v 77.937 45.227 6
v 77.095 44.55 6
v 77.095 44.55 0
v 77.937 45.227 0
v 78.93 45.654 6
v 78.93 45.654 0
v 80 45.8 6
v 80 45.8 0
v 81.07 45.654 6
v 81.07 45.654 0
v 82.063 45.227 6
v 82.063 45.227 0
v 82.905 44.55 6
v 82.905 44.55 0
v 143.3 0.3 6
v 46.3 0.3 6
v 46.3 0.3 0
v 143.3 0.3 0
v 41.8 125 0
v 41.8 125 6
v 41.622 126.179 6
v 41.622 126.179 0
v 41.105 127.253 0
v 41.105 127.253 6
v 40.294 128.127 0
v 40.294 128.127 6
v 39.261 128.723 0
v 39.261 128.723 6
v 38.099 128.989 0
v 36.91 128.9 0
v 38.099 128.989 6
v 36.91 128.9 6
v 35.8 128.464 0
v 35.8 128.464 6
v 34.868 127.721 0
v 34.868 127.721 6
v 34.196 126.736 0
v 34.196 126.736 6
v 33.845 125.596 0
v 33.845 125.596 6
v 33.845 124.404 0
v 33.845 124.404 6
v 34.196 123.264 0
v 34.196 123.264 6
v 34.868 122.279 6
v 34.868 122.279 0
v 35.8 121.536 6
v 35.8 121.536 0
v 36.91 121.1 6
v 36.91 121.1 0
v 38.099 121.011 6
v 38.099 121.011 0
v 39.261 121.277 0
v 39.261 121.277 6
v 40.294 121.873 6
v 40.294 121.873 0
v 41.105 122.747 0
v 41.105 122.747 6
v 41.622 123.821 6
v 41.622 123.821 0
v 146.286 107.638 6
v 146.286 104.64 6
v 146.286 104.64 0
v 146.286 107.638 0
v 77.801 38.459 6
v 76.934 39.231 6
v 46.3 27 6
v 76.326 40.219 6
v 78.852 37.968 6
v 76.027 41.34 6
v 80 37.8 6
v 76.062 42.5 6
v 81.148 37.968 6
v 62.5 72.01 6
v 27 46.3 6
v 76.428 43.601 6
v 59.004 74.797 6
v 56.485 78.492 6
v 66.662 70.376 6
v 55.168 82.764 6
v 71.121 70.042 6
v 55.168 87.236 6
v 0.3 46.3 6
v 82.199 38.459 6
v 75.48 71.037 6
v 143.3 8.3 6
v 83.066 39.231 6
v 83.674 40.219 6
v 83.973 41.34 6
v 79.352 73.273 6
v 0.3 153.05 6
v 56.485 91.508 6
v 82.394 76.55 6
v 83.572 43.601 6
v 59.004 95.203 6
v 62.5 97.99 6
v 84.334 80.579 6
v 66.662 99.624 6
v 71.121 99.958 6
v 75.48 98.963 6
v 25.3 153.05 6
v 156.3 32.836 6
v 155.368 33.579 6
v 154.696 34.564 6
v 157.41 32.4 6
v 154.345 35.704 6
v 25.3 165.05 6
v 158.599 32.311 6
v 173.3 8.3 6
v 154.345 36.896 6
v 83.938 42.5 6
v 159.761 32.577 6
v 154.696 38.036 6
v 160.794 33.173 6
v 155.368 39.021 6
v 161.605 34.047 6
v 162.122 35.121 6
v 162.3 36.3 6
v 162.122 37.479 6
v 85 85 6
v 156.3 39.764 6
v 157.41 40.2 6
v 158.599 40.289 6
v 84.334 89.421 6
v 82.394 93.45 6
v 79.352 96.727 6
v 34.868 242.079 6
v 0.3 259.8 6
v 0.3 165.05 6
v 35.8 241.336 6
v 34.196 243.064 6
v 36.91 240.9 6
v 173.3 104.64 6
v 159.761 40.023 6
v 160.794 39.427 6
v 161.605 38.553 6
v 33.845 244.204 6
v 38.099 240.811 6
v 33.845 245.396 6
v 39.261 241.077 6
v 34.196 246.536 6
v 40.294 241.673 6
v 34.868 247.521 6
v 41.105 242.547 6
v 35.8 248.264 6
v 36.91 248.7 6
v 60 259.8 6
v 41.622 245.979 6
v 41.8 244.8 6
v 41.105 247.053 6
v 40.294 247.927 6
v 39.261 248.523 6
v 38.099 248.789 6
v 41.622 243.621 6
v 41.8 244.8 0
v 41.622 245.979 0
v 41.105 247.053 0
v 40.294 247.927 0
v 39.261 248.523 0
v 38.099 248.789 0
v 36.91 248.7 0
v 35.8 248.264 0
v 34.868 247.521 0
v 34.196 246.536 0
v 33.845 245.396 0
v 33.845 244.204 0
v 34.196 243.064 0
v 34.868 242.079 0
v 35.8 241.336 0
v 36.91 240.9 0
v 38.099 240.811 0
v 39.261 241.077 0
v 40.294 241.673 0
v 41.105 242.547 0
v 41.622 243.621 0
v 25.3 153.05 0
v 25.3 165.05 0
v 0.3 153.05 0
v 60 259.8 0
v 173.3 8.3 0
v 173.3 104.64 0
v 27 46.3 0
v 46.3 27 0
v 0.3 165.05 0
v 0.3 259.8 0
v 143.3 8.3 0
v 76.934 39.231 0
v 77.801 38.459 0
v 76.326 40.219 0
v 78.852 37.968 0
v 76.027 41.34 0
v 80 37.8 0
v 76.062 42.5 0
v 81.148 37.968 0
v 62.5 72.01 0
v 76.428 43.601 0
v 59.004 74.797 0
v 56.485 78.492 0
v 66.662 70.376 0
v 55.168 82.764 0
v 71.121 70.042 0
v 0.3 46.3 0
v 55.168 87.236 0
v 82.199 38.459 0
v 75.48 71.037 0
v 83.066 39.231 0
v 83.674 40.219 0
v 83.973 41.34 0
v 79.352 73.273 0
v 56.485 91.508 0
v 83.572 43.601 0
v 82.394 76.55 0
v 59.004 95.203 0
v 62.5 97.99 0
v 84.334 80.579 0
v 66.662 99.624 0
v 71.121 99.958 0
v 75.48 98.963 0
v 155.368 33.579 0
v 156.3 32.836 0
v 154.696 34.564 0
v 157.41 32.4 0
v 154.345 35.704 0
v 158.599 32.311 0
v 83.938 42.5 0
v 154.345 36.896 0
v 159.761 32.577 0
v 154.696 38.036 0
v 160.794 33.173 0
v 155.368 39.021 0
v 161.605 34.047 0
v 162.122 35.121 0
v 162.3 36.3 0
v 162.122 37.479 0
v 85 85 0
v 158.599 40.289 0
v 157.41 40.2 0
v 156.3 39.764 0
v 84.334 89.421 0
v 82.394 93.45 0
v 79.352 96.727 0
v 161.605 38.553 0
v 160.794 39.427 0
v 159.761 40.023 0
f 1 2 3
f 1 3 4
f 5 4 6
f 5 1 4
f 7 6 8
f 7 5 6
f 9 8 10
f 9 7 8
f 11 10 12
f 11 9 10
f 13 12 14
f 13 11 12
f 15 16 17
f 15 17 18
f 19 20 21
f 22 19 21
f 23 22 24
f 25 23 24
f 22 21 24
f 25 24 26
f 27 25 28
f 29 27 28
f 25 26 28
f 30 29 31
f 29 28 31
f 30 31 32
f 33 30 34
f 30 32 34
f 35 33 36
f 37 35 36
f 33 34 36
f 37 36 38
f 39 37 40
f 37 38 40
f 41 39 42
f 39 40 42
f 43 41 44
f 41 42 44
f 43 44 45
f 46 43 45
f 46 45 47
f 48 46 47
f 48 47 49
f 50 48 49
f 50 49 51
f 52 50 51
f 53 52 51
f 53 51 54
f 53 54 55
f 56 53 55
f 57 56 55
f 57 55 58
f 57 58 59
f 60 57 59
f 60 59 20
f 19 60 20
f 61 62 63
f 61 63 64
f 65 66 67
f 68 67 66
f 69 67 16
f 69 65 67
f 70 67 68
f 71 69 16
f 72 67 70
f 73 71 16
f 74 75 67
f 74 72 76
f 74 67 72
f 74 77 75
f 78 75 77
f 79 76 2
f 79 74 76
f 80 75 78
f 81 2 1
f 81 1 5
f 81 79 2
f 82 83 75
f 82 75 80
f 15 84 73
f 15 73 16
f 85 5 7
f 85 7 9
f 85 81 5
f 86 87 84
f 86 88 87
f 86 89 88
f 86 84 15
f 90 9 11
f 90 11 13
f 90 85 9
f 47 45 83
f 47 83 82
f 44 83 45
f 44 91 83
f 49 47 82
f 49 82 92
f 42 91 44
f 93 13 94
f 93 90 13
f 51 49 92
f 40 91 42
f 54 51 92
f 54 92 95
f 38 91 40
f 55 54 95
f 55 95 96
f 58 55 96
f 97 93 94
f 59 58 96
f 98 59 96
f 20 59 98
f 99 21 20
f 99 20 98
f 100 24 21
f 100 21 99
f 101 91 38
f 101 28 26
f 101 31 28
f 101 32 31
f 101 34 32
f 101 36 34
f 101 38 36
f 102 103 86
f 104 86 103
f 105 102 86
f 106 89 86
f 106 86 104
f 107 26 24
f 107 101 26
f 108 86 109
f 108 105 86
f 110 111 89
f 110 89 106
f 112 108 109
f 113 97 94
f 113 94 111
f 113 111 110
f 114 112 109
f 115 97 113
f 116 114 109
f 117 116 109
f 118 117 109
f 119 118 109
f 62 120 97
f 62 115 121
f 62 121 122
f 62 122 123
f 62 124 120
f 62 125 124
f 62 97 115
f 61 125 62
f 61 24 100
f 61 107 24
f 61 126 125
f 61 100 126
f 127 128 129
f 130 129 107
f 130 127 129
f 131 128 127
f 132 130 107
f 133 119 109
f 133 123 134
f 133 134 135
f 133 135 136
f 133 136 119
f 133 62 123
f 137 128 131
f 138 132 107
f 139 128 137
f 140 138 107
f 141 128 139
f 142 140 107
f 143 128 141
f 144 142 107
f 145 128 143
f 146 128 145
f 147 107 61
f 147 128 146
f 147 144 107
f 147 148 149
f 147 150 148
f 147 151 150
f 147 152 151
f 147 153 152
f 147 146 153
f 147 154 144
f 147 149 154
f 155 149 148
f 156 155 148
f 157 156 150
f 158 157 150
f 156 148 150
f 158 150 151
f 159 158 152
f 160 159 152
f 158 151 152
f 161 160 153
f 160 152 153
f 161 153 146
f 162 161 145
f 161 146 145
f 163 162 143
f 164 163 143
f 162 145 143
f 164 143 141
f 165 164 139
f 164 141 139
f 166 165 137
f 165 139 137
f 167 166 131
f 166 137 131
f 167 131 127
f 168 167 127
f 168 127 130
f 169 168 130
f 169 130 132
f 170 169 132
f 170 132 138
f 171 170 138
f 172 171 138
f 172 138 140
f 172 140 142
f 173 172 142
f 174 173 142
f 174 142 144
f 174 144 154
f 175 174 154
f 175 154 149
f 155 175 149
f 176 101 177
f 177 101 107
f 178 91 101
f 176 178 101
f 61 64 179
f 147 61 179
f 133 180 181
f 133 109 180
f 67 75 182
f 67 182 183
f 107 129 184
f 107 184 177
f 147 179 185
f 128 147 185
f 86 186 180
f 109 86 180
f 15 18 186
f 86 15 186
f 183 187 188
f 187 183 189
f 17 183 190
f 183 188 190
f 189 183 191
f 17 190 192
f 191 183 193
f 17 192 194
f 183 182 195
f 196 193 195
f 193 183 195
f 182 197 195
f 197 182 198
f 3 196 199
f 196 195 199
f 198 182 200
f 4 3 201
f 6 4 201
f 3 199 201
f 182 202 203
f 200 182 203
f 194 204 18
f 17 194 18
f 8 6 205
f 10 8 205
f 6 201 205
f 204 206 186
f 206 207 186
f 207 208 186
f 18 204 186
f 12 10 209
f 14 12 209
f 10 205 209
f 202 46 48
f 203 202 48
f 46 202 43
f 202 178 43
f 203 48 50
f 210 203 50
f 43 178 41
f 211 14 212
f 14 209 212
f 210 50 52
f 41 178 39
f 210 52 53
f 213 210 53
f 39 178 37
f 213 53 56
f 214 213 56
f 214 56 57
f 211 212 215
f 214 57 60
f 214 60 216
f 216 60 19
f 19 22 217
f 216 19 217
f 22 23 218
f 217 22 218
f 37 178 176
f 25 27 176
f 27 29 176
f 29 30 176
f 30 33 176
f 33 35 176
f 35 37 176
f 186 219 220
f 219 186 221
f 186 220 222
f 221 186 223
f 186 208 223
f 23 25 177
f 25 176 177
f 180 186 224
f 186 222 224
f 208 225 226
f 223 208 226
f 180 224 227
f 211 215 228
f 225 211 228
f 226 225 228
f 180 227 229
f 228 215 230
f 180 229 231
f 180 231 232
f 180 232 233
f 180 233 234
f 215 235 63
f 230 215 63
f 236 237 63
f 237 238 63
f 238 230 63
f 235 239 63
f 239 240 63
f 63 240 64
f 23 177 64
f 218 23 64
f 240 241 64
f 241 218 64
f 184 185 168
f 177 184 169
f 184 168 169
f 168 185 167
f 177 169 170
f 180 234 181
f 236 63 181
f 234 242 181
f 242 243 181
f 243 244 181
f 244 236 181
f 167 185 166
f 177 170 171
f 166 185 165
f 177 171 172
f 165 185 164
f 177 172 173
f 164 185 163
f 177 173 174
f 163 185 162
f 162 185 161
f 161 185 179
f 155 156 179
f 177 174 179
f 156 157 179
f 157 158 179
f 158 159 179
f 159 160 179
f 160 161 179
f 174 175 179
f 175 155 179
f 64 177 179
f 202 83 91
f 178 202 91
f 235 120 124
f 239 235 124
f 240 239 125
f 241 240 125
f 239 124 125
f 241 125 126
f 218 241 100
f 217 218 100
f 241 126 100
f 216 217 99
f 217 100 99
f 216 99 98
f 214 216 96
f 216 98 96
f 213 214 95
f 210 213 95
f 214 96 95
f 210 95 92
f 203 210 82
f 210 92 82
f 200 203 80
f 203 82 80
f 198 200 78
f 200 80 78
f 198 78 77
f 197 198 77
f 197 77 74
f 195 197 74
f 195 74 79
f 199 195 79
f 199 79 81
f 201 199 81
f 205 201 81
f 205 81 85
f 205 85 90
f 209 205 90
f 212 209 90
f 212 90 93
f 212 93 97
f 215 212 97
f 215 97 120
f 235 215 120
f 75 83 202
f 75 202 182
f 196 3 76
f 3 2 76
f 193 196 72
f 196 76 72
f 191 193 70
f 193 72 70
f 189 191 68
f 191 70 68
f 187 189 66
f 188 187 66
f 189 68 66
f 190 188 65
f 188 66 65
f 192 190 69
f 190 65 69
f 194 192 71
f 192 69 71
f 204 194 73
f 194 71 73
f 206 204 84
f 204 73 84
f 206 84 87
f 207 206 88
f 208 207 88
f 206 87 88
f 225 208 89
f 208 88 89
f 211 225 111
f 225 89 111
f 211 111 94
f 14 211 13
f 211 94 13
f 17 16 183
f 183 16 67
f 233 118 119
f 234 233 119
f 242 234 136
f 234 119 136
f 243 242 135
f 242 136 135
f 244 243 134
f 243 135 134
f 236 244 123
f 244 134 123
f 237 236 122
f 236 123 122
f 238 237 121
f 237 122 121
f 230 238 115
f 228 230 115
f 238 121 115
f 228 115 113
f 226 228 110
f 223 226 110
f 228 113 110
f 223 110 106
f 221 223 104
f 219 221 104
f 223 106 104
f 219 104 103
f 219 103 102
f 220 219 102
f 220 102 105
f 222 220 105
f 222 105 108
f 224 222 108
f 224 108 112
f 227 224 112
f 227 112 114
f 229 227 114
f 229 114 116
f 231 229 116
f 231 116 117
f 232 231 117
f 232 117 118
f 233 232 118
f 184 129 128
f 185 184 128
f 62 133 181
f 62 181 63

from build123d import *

# Parameters (mm, degrees)
BOSS_EXTRUDE1_DEPTH     = 6
SKETCH2_R               = 4
SKETCH2_R_2             = 15
CUT_EXTRUDE1_DEPTH      = 313.353853826
CROQUIS2_W              = 97
CROQUIS2_H              = 0.3
CORTAR_EXTRUIR1_DEPTH   = 10
CORTAR_EXTRUIR2_DEPTH   = 10
CROQUIS4_R              = 4
CORTAR_EXTRUIR3_DEPTH   = 6
SALIENTE_EXTRUIR2_DEPTH = 6
CROQUIS7_W              = 0.3
CROQUIS7_H              = 222.05
CORTAR_EXTRUIR4_DEPTH   = 6
CROQUIS8_W              = 25
CROQUIS8_H              = 12
CORTAR_EXTRUIR5_DEPTH   = 6
SALIENTE_EXTRUIR3_DEPTH = 10
CORTAR_EXTRUIR6_DEPTH   = 10
SALIENTE_EXTRUIR4_DEPTH = 16
CROQUIS12_W             = 25.313873874
CROQUIS12_H             = 10
CORTAR_EXTRUIR7_DEPTH   = 67
CROQUIS13_R             = 4
CORTAR_EXTRUIR8_DEPTH   = 10
SALIENTE_EXTRUIR5_DEPTH = 6
CROQUIS15_R             = 4
CORTAR_EXTRUIR9_DEPTH   = 10
SALIENTE_EXTRUIR7_DEPTH = 6
CROQUIS18_R             = 4
CORTAR_EXTRUIR10_DEPTH  = 6
SALIENTE_EXTRUIR8_DEPTH = 6


with BuildPart() as part:
    # Sketch1 → Boss-Extrude1 (new body)
    with BuildSketch(Plane.XY):
        Polygon((0, 0), (143.3, 0), (143.3, 8.3), (173.3, 8.3), (173.3, 60), (60, 259.8), (0, 259.8), align=None)
    extrude(amount=BOSS_EXTRUDE1_DEPTH)

    # Sketch2 → Cut-Extrude1 (cut, through all)
    with BuildSketch(Plane.XY.offset(6)):
        with Locations((158.3, 36.3)):
            Circle(SKETCH2_R)
        with Locations((37.8, 244.8)):
            Circle(SKETCH2_R)
        with Locations((37.8, 125)):
            Circle(SKETCH2_R)
        with Locations((80, 43.8)):
            Circle(SKETCH2_R)
        with Locations((70, 85)):
            Circle(SKETCH2_R_2)
        Polygon((46.3, 0), (46.3, 19), (19, 46.3), (0, 46.3), (0, 0), align=None)
    extrude(amount=-CUT_EXTRUDE1_DEPTH, mode=Mode.SUBTRACT)

    # Croquis2 → Cortar-Extruir1 (cut)
    with BuildSketch(Plane.XY.offset(6)):
        with Locations((94.8, 0.15)):
            Rectangle(CROQUIS2_W, CROQUIS2_H)
    extrude(amount=-CORTAR_EXTRUIR1_DEPTH, mode=Mode.SUBTRACT)

    # Croquis3 → Cortar-Extruir2 (cut)
    with BuildSketch(Plane.XY.offset(6)):
        Polygon((46.3, 19), (19, 46.3), (27, 46.3), (46.3, 27), align=None)
    extrude(amount=-CORTAR_EXTRUIR2_DEPTH, mode=Mode.SUBTRACT)

    # Croquis4 → Cortar-Extruir3 (cut)
    with BuildSketch(Plane.XY.offset(6)):
        with Locations((80, 36.3)):
            Circle(CROQUIS4_R)
        with Locations((80, 43.8)):
            Circle(CROQUIS4_R)
    extrude(amount=-CORTAR_EXTRUIR3_DEPTH, mode=Mode.SUBTRACT)

    # Croquis6 → Saliente-Extruir2 (add)
    with BuildSketch(Plane.XY.offset(6)):
        with BuildLine():
            ThreePointArc((81.391941091, 40.05), (83.283882181, 41.516117819), (84, 43.8))
            ThreePointArc((84, 43.8), (77.716117819, 47.083882181), (78.608058909, 40.05))
            ThreePointArc((78.608058909, 40.05), (80, 40.3), (81.391941091, 40.05))
        make_face()
    extrude(amount=-SALIENTE_EXTRUIR2_DEPTH)

    # Croquis7 → Cortar-Extruir4 (cut)
    with BuildSketch(Plane.XY.offset(6)):
        with Locations((0.15, 148.775)):
            Rectangle(CROQUIS7_W, CROQUIS7_H)
    extrude(amount=-CORTAR_EXTRUIR4_DEPTH, mode=Mode.SUBTRACT)

    # Croquis8 → Cortar-Extruir5 (cut)
    with BuildSketch(Plane.XY.offset(6)):
        with Locations((12.8, 159.05)):
            Rectangle(CROQUIS8_W, CROQUIS8_H)
    extrude(amount=-CORTAR_EXTRUIR5_DEPTH, mode=Mode.SUBTRACT)

    # Croquis10 → Cortar-Extruir6 (cut)
    with BuildSketch(Plane.XY.offset(6)):
        Polygon((147.986126126, 104.64), (146.286126126, 104.64), (146.286126126, 107.63788173), align=None)
    extrude(amount=-CORTAR_EXTRUIR6_DEPTH, mode=Mode.SUBTRACT)



with BuildPart() as body_2:
    # Croquis9 → Saliente-Extruir3 (new body)
    with BuildSketch(Plane.XY.offset(6)):
        Polygon((147.986126126, 104.64), (173.3, 60), (173.3, 104.64), align=None)
    extrude(amount=SALIENTE_EXTRUIR3_DEPTH)


with BuildPart() as part_1:
    add(part.part)

    add(body_2.part)  # Saliente-Extruir4 merges body 2
    # Croquis11 → Saliente-Extruir4 (add)
    with BuildSketch(Plane.XY.offset(16)):
        Polygon((173.3, 60), (173.3, 104.64), (147.986126126, 104.64), align=None)
    extrude(amount=-SALIENTE_EXTRUIR4_DEPTH)

    # Croquis12 → Cortar-Extruir7 (cut)
    with BuildSketch(Plane(origin=(0, 104.64, 0), x_dir=(1, 0, 0), z_dir=(0, 1, 0))):
        with Locations((160.643063063, -11)):
            Rectangle(CROQUIS12_W, CROQUIS12_H)
    extrude(amount=-CORTAR_EXTRUIR7_DEPTH, mode=Mode.SUBTRACT)

    # Croquis13 → Cortar-Extruir8 (cut)
    with BuildSketch(Plane.XY.offset(6)):
        with Locations((80, 41.8)):
            Circle(CROQUIS13_R)
    extrude(amount=-CORTAR_EXTRUIR8_DEPTH, mode=Mode.SUBTRACT)

    # Croquis14 → Saliente-Extruir5 (add)
    with BuildSketch(Plane.XY.offset(6)):
        with BuildLine():
            ThreePointArc((82.90473751, 39.05), (80, 37.8), (77.09526249, 39.05))
            ThreePointArc((77.09526249, 39.05), (78.519957777, 32.5838898), (84, 36.3))
            ThreePointArc((84, 36.3), (83.7161102, 37.780042223), (82.90473751, 39.05))
        make_face()
    extrude(amount=-SALIENTE_EXTRUIR5_DEPTH)

    # Croquis15 → Cortar-Extruir9 (cut)
    with BuildSketch(Plane.XY.offset(6)):
        with Locations((80, 47.3)):
            Circle(CROQUIS15_R)
    extrude(amount=-CORTAR_EXTRUIR9_DEPTH, mode=Mode.SUBTRACT)

    # Croquis16 → Saliente-Extruir7 (add)
    with BuildSketch(Plane.XY.offset(6)):
        with BuildLine():
            ThreePointArc((77.09526249, 44.55), (78.519957777, 38.0838898), (84, 41.8))
            ThreePointArc((84, 41.8), (83.7161102, 43.280042223), (82.90473751, 44.55))
            ThreePointArc((82.90473751, 44.55), (80, 43.3), (77.09526249, 44.55))
        make_face()
    extrude(amount=-SALIENTE_EXTRUIR7_DEPTH)

    # Croquis18 → Cortar-Extruir10 (cut)
    with BuildSketch(Plane.XY.offset(6)):
        with Locations((80, 41.8)):
            Circle(CROQUIS18_R)
    extrude(amount=-CORTAR_EXTRUIR10_DEPTH, mode=Mode.SUBTRACT)

    # Croquis19 → Saliente-Extruir8 (add)
    with BuildSketch(Plane.XY.offset(6)):
        with BuildLine():
            ThreePointArc((82.90473751, 44.55), (83.7161102, 45.819957777), (84, 47.3))
            ThreePointArc((84, 47.3), (78.519957777, 51.0161102), (77.09526249, 44.55))
            ThreePointArc((77.09526249, 44.55), (80, 45.8), (82.90473751, 44.55))
        make_face()
    extrude(amount=-SALIENTE_EXTRUIR8_DEPTH)


solid = part_1.part
